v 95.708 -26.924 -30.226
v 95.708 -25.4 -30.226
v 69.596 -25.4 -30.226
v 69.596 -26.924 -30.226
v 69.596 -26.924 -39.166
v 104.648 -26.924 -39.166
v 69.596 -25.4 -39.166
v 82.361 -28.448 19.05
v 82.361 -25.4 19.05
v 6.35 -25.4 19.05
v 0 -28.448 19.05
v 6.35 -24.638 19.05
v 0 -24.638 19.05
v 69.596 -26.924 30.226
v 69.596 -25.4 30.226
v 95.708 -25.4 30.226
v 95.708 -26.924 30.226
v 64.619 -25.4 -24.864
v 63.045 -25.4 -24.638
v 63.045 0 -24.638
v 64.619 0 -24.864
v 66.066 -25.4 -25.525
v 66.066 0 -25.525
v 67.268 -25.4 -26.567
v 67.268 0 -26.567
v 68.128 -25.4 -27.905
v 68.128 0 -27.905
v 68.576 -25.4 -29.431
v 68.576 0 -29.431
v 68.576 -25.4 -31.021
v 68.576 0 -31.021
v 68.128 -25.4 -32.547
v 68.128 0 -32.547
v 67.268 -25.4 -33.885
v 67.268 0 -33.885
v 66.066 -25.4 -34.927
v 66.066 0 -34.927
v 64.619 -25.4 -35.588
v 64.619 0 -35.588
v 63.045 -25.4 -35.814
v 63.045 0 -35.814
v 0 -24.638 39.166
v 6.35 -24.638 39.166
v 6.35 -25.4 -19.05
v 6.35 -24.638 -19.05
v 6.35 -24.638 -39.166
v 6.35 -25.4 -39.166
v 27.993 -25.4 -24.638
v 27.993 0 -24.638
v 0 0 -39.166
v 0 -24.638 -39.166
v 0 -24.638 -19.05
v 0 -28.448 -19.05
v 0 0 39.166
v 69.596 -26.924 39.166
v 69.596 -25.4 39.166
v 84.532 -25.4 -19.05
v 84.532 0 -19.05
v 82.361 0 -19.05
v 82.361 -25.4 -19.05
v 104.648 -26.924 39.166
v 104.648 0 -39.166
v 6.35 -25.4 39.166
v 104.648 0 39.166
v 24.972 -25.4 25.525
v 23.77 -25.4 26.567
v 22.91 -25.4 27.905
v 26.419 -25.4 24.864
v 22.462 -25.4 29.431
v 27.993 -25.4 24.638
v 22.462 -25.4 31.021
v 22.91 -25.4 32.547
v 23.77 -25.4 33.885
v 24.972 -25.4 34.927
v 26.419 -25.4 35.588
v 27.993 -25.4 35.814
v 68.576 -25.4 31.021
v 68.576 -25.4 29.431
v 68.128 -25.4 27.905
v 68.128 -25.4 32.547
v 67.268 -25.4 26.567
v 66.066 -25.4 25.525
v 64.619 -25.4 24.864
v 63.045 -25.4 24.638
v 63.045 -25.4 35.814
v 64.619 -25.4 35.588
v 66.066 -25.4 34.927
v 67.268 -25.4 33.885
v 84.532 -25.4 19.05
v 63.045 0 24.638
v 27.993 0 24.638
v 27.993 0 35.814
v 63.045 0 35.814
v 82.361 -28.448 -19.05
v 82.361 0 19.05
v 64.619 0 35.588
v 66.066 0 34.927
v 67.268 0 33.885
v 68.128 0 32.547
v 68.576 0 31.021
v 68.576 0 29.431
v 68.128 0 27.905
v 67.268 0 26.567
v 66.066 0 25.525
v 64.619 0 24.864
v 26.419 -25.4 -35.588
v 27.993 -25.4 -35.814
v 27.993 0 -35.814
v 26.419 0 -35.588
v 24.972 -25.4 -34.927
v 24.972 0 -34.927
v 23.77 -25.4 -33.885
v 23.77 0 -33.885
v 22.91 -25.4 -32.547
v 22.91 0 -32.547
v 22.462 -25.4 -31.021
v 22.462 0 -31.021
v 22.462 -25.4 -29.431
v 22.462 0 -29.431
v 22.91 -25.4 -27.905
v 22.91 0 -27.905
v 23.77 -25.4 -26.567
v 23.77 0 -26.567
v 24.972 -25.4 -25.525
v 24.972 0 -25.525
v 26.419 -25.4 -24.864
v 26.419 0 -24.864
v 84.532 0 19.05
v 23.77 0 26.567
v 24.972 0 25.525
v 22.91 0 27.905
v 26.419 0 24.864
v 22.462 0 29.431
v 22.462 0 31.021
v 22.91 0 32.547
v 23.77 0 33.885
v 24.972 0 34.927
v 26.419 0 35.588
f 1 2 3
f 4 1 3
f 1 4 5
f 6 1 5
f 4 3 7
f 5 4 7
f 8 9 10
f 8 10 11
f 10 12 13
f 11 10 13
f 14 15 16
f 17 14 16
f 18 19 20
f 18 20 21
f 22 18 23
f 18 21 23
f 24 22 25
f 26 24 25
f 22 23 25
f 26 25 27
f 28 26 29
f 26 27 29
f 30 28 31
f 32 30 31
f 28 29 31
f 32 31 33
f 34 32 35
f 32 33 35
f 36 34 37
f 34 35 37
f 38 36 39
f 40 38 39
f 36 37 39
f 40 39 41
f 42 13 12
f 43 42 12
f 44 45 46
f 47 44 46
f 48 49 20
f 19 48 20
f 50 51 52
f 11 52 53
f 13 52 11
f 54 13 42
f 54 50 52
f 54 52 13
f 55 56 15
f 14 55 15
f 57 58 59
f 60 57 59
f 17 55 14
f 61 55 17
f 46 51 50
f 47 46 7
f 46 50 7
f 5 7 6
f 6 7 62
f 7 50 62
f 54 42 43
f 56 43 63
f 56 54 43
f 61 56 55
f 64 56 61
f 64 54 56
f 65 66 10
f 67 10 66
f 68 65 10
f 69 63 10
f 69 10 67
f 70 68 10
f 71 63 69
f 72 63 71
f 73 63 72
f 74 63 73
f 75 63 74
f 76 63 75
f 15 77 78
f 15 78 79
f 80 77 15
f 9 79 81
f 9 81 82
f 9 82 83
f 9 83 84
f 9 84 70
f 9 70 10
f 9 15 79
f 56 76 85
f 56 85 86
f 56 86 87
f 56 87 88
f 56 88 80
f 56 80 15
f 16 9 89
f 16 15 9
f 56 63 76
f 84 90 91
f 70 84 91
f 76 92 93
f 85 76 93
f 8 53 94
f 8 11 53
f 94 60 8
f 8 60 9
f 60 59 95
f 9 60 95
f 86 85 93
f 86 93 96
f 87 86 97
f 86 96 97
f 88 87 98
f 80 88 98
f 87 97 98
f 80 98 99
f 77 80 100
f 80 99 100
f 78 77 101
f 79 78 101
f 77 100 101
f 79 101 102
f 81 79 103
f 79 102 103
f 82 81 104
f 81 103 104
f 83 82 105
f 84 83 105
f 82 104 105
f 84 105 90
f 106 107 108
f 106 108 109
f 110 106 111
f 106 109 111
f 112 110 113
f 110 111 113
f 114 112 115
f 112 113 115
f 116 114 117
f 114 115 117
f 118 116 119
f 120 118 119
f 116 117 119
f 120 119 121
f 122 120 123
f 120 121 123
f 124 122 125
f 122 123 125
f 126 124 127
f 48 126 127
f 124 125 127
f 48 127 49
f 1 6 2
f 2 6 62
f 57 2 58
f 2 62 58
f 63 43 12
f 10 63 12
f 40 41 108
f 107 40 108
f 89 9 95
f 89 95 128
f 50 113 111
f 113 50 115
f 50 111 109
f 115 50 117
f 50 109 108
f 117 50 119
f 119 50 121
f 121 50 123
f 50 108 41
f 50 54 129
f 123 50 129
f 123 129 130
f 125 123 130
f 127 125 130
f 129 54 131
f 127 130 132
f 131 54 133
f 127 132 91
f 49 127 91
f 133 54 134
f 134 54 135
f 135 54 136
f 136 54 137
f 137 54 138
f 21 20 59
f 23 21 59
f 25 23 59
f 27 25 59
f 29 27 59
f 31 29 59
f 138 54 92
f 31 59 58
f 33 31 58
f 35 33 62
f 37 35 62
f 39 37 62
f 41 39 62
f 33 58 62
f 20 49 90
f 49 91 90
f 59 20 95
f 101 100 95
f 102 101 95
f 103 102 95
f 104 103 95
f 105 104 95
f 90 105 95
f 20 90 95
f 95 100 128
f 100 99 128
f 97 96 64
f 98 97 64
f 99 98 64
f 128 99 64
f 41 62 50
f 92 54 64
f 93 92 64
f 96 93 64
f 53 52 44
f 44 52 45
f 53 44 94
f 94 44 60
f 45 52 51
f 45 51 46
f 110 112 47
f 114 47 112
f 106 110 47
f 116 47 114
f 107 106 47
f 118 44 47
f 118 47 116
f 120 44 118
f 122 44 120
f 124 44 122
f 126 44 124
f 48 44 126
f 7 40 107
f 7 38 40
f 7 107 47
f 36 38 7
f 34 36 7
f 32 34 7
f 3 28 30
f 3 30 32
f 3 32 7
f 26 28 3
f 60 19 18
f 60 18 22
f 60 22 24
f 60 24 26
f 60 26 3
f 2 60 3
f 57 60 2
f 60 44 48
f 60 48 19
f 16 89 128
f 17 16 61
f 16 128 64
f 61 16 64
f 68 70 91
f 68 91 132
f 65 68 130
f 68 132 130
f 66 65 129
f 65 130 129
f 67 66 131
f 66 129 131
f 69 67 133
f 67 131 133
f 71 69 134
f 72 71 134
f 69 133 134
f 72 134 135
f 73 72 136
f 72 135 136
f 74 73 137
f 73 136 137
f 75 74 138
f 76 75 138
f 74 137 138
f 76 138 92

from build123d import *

# Parameters (mm, degrees)
F1_DEPTH = 28.448
F2_DEPTH = 25.4
F3_DEPTH = 26.924
F4_DEPTH = 26.924
F0_W     = 6.35
F0_H     = 20.115774
F5_DEPTH = 24.638


with BuildPart() as f1:
    # F0 (on Front) → F1 (new body)
    with BuildSketch(Plane.XZ):
        Polygon((0, 0), (0, -19.05), (6.35, -19.05), (82.361273, -19.05), (82.361273, 19.05), (6.35, 19.05), (0, 19.05), align=None)
    extrude(amount=F1_DEPTH)

    # F0 (on Front) → F2 (join)
    with BuildSketch(Plane.XZ):
        Polygon((6.35, 19.05), (82.361273, 19.05), (84.532226, 19.05), (95.708226, 30.226), (69.596, 30.226), (69.596, 39.165774), (6.35, 39.165774), align=None)
        with BuildLine():
            Line((27.993083, 35.814), (63.045083, 35.814))
            ThreePointArc((63.045083, 35.814), (68.633083, 30.226), (63.045083, 24.638))
            Line((63.045083, 24.638), (27.993083, 24.638))
            ThreePointArc((27.993083, 24.638), (22.405083, 30.226), (27.993083, 35.814))
        make_face(mode=Mode.SUBTRACT)
        Polygon((6.35, -19.05), (6.35, -39.165774), (69.596, -39.165774), (69.596, -30.226), (95.708226, -30.226), (84.532226, -19.05), (82.361273, -19.05), align=None)
        with BuildLine():
            ThreePointArc((27.993083, -35.814), (22.405083, -30.226), (27.993083, -24.638))
            Line((27.993083, -24.638), (63.045083, -24.638))
            ThreePointArc((63.045083, -24.638), (68.633083, -30.226), (63.045083, -35.814))
            Line((63.045083, -35.814), (27.993083, -35.814))
        make_face(mode=Mode.SUBTRACT)
    extrude(amount=F2_DEPTH)

    # F0 (on Front) → F3 (join)
    with BuildSketch(Plane.XZ):
        Polygon((69.596, -30.226), (69.596, -39.165774), (104.648, -39.165774), (95.708226, -30.226), align=None)
    extrude(amount=F3_DEPTH)

    # F0 (on Front) → F4 (join)
    with BuildSketch(Plane.XZ):
        Polygon((69.596, 30.226), (95.708226, 30.226), (104.648, 39.165774), (69.596, 39.165774), align=None)
    extrude(amount=F4_DEPTH)

    # F0 (on Front) → F5 (join)
    with BuildSketch(Plane.XZ):
        with Locations((3.175, -29.107887)):
            Rectangle(F0_W, F0_H)
        with Locations((3.175, 29.107887)):
            Rectangle(F0_W, F0_H)
    extrude(amount=F5_DEPTH)


solid = f1.part
